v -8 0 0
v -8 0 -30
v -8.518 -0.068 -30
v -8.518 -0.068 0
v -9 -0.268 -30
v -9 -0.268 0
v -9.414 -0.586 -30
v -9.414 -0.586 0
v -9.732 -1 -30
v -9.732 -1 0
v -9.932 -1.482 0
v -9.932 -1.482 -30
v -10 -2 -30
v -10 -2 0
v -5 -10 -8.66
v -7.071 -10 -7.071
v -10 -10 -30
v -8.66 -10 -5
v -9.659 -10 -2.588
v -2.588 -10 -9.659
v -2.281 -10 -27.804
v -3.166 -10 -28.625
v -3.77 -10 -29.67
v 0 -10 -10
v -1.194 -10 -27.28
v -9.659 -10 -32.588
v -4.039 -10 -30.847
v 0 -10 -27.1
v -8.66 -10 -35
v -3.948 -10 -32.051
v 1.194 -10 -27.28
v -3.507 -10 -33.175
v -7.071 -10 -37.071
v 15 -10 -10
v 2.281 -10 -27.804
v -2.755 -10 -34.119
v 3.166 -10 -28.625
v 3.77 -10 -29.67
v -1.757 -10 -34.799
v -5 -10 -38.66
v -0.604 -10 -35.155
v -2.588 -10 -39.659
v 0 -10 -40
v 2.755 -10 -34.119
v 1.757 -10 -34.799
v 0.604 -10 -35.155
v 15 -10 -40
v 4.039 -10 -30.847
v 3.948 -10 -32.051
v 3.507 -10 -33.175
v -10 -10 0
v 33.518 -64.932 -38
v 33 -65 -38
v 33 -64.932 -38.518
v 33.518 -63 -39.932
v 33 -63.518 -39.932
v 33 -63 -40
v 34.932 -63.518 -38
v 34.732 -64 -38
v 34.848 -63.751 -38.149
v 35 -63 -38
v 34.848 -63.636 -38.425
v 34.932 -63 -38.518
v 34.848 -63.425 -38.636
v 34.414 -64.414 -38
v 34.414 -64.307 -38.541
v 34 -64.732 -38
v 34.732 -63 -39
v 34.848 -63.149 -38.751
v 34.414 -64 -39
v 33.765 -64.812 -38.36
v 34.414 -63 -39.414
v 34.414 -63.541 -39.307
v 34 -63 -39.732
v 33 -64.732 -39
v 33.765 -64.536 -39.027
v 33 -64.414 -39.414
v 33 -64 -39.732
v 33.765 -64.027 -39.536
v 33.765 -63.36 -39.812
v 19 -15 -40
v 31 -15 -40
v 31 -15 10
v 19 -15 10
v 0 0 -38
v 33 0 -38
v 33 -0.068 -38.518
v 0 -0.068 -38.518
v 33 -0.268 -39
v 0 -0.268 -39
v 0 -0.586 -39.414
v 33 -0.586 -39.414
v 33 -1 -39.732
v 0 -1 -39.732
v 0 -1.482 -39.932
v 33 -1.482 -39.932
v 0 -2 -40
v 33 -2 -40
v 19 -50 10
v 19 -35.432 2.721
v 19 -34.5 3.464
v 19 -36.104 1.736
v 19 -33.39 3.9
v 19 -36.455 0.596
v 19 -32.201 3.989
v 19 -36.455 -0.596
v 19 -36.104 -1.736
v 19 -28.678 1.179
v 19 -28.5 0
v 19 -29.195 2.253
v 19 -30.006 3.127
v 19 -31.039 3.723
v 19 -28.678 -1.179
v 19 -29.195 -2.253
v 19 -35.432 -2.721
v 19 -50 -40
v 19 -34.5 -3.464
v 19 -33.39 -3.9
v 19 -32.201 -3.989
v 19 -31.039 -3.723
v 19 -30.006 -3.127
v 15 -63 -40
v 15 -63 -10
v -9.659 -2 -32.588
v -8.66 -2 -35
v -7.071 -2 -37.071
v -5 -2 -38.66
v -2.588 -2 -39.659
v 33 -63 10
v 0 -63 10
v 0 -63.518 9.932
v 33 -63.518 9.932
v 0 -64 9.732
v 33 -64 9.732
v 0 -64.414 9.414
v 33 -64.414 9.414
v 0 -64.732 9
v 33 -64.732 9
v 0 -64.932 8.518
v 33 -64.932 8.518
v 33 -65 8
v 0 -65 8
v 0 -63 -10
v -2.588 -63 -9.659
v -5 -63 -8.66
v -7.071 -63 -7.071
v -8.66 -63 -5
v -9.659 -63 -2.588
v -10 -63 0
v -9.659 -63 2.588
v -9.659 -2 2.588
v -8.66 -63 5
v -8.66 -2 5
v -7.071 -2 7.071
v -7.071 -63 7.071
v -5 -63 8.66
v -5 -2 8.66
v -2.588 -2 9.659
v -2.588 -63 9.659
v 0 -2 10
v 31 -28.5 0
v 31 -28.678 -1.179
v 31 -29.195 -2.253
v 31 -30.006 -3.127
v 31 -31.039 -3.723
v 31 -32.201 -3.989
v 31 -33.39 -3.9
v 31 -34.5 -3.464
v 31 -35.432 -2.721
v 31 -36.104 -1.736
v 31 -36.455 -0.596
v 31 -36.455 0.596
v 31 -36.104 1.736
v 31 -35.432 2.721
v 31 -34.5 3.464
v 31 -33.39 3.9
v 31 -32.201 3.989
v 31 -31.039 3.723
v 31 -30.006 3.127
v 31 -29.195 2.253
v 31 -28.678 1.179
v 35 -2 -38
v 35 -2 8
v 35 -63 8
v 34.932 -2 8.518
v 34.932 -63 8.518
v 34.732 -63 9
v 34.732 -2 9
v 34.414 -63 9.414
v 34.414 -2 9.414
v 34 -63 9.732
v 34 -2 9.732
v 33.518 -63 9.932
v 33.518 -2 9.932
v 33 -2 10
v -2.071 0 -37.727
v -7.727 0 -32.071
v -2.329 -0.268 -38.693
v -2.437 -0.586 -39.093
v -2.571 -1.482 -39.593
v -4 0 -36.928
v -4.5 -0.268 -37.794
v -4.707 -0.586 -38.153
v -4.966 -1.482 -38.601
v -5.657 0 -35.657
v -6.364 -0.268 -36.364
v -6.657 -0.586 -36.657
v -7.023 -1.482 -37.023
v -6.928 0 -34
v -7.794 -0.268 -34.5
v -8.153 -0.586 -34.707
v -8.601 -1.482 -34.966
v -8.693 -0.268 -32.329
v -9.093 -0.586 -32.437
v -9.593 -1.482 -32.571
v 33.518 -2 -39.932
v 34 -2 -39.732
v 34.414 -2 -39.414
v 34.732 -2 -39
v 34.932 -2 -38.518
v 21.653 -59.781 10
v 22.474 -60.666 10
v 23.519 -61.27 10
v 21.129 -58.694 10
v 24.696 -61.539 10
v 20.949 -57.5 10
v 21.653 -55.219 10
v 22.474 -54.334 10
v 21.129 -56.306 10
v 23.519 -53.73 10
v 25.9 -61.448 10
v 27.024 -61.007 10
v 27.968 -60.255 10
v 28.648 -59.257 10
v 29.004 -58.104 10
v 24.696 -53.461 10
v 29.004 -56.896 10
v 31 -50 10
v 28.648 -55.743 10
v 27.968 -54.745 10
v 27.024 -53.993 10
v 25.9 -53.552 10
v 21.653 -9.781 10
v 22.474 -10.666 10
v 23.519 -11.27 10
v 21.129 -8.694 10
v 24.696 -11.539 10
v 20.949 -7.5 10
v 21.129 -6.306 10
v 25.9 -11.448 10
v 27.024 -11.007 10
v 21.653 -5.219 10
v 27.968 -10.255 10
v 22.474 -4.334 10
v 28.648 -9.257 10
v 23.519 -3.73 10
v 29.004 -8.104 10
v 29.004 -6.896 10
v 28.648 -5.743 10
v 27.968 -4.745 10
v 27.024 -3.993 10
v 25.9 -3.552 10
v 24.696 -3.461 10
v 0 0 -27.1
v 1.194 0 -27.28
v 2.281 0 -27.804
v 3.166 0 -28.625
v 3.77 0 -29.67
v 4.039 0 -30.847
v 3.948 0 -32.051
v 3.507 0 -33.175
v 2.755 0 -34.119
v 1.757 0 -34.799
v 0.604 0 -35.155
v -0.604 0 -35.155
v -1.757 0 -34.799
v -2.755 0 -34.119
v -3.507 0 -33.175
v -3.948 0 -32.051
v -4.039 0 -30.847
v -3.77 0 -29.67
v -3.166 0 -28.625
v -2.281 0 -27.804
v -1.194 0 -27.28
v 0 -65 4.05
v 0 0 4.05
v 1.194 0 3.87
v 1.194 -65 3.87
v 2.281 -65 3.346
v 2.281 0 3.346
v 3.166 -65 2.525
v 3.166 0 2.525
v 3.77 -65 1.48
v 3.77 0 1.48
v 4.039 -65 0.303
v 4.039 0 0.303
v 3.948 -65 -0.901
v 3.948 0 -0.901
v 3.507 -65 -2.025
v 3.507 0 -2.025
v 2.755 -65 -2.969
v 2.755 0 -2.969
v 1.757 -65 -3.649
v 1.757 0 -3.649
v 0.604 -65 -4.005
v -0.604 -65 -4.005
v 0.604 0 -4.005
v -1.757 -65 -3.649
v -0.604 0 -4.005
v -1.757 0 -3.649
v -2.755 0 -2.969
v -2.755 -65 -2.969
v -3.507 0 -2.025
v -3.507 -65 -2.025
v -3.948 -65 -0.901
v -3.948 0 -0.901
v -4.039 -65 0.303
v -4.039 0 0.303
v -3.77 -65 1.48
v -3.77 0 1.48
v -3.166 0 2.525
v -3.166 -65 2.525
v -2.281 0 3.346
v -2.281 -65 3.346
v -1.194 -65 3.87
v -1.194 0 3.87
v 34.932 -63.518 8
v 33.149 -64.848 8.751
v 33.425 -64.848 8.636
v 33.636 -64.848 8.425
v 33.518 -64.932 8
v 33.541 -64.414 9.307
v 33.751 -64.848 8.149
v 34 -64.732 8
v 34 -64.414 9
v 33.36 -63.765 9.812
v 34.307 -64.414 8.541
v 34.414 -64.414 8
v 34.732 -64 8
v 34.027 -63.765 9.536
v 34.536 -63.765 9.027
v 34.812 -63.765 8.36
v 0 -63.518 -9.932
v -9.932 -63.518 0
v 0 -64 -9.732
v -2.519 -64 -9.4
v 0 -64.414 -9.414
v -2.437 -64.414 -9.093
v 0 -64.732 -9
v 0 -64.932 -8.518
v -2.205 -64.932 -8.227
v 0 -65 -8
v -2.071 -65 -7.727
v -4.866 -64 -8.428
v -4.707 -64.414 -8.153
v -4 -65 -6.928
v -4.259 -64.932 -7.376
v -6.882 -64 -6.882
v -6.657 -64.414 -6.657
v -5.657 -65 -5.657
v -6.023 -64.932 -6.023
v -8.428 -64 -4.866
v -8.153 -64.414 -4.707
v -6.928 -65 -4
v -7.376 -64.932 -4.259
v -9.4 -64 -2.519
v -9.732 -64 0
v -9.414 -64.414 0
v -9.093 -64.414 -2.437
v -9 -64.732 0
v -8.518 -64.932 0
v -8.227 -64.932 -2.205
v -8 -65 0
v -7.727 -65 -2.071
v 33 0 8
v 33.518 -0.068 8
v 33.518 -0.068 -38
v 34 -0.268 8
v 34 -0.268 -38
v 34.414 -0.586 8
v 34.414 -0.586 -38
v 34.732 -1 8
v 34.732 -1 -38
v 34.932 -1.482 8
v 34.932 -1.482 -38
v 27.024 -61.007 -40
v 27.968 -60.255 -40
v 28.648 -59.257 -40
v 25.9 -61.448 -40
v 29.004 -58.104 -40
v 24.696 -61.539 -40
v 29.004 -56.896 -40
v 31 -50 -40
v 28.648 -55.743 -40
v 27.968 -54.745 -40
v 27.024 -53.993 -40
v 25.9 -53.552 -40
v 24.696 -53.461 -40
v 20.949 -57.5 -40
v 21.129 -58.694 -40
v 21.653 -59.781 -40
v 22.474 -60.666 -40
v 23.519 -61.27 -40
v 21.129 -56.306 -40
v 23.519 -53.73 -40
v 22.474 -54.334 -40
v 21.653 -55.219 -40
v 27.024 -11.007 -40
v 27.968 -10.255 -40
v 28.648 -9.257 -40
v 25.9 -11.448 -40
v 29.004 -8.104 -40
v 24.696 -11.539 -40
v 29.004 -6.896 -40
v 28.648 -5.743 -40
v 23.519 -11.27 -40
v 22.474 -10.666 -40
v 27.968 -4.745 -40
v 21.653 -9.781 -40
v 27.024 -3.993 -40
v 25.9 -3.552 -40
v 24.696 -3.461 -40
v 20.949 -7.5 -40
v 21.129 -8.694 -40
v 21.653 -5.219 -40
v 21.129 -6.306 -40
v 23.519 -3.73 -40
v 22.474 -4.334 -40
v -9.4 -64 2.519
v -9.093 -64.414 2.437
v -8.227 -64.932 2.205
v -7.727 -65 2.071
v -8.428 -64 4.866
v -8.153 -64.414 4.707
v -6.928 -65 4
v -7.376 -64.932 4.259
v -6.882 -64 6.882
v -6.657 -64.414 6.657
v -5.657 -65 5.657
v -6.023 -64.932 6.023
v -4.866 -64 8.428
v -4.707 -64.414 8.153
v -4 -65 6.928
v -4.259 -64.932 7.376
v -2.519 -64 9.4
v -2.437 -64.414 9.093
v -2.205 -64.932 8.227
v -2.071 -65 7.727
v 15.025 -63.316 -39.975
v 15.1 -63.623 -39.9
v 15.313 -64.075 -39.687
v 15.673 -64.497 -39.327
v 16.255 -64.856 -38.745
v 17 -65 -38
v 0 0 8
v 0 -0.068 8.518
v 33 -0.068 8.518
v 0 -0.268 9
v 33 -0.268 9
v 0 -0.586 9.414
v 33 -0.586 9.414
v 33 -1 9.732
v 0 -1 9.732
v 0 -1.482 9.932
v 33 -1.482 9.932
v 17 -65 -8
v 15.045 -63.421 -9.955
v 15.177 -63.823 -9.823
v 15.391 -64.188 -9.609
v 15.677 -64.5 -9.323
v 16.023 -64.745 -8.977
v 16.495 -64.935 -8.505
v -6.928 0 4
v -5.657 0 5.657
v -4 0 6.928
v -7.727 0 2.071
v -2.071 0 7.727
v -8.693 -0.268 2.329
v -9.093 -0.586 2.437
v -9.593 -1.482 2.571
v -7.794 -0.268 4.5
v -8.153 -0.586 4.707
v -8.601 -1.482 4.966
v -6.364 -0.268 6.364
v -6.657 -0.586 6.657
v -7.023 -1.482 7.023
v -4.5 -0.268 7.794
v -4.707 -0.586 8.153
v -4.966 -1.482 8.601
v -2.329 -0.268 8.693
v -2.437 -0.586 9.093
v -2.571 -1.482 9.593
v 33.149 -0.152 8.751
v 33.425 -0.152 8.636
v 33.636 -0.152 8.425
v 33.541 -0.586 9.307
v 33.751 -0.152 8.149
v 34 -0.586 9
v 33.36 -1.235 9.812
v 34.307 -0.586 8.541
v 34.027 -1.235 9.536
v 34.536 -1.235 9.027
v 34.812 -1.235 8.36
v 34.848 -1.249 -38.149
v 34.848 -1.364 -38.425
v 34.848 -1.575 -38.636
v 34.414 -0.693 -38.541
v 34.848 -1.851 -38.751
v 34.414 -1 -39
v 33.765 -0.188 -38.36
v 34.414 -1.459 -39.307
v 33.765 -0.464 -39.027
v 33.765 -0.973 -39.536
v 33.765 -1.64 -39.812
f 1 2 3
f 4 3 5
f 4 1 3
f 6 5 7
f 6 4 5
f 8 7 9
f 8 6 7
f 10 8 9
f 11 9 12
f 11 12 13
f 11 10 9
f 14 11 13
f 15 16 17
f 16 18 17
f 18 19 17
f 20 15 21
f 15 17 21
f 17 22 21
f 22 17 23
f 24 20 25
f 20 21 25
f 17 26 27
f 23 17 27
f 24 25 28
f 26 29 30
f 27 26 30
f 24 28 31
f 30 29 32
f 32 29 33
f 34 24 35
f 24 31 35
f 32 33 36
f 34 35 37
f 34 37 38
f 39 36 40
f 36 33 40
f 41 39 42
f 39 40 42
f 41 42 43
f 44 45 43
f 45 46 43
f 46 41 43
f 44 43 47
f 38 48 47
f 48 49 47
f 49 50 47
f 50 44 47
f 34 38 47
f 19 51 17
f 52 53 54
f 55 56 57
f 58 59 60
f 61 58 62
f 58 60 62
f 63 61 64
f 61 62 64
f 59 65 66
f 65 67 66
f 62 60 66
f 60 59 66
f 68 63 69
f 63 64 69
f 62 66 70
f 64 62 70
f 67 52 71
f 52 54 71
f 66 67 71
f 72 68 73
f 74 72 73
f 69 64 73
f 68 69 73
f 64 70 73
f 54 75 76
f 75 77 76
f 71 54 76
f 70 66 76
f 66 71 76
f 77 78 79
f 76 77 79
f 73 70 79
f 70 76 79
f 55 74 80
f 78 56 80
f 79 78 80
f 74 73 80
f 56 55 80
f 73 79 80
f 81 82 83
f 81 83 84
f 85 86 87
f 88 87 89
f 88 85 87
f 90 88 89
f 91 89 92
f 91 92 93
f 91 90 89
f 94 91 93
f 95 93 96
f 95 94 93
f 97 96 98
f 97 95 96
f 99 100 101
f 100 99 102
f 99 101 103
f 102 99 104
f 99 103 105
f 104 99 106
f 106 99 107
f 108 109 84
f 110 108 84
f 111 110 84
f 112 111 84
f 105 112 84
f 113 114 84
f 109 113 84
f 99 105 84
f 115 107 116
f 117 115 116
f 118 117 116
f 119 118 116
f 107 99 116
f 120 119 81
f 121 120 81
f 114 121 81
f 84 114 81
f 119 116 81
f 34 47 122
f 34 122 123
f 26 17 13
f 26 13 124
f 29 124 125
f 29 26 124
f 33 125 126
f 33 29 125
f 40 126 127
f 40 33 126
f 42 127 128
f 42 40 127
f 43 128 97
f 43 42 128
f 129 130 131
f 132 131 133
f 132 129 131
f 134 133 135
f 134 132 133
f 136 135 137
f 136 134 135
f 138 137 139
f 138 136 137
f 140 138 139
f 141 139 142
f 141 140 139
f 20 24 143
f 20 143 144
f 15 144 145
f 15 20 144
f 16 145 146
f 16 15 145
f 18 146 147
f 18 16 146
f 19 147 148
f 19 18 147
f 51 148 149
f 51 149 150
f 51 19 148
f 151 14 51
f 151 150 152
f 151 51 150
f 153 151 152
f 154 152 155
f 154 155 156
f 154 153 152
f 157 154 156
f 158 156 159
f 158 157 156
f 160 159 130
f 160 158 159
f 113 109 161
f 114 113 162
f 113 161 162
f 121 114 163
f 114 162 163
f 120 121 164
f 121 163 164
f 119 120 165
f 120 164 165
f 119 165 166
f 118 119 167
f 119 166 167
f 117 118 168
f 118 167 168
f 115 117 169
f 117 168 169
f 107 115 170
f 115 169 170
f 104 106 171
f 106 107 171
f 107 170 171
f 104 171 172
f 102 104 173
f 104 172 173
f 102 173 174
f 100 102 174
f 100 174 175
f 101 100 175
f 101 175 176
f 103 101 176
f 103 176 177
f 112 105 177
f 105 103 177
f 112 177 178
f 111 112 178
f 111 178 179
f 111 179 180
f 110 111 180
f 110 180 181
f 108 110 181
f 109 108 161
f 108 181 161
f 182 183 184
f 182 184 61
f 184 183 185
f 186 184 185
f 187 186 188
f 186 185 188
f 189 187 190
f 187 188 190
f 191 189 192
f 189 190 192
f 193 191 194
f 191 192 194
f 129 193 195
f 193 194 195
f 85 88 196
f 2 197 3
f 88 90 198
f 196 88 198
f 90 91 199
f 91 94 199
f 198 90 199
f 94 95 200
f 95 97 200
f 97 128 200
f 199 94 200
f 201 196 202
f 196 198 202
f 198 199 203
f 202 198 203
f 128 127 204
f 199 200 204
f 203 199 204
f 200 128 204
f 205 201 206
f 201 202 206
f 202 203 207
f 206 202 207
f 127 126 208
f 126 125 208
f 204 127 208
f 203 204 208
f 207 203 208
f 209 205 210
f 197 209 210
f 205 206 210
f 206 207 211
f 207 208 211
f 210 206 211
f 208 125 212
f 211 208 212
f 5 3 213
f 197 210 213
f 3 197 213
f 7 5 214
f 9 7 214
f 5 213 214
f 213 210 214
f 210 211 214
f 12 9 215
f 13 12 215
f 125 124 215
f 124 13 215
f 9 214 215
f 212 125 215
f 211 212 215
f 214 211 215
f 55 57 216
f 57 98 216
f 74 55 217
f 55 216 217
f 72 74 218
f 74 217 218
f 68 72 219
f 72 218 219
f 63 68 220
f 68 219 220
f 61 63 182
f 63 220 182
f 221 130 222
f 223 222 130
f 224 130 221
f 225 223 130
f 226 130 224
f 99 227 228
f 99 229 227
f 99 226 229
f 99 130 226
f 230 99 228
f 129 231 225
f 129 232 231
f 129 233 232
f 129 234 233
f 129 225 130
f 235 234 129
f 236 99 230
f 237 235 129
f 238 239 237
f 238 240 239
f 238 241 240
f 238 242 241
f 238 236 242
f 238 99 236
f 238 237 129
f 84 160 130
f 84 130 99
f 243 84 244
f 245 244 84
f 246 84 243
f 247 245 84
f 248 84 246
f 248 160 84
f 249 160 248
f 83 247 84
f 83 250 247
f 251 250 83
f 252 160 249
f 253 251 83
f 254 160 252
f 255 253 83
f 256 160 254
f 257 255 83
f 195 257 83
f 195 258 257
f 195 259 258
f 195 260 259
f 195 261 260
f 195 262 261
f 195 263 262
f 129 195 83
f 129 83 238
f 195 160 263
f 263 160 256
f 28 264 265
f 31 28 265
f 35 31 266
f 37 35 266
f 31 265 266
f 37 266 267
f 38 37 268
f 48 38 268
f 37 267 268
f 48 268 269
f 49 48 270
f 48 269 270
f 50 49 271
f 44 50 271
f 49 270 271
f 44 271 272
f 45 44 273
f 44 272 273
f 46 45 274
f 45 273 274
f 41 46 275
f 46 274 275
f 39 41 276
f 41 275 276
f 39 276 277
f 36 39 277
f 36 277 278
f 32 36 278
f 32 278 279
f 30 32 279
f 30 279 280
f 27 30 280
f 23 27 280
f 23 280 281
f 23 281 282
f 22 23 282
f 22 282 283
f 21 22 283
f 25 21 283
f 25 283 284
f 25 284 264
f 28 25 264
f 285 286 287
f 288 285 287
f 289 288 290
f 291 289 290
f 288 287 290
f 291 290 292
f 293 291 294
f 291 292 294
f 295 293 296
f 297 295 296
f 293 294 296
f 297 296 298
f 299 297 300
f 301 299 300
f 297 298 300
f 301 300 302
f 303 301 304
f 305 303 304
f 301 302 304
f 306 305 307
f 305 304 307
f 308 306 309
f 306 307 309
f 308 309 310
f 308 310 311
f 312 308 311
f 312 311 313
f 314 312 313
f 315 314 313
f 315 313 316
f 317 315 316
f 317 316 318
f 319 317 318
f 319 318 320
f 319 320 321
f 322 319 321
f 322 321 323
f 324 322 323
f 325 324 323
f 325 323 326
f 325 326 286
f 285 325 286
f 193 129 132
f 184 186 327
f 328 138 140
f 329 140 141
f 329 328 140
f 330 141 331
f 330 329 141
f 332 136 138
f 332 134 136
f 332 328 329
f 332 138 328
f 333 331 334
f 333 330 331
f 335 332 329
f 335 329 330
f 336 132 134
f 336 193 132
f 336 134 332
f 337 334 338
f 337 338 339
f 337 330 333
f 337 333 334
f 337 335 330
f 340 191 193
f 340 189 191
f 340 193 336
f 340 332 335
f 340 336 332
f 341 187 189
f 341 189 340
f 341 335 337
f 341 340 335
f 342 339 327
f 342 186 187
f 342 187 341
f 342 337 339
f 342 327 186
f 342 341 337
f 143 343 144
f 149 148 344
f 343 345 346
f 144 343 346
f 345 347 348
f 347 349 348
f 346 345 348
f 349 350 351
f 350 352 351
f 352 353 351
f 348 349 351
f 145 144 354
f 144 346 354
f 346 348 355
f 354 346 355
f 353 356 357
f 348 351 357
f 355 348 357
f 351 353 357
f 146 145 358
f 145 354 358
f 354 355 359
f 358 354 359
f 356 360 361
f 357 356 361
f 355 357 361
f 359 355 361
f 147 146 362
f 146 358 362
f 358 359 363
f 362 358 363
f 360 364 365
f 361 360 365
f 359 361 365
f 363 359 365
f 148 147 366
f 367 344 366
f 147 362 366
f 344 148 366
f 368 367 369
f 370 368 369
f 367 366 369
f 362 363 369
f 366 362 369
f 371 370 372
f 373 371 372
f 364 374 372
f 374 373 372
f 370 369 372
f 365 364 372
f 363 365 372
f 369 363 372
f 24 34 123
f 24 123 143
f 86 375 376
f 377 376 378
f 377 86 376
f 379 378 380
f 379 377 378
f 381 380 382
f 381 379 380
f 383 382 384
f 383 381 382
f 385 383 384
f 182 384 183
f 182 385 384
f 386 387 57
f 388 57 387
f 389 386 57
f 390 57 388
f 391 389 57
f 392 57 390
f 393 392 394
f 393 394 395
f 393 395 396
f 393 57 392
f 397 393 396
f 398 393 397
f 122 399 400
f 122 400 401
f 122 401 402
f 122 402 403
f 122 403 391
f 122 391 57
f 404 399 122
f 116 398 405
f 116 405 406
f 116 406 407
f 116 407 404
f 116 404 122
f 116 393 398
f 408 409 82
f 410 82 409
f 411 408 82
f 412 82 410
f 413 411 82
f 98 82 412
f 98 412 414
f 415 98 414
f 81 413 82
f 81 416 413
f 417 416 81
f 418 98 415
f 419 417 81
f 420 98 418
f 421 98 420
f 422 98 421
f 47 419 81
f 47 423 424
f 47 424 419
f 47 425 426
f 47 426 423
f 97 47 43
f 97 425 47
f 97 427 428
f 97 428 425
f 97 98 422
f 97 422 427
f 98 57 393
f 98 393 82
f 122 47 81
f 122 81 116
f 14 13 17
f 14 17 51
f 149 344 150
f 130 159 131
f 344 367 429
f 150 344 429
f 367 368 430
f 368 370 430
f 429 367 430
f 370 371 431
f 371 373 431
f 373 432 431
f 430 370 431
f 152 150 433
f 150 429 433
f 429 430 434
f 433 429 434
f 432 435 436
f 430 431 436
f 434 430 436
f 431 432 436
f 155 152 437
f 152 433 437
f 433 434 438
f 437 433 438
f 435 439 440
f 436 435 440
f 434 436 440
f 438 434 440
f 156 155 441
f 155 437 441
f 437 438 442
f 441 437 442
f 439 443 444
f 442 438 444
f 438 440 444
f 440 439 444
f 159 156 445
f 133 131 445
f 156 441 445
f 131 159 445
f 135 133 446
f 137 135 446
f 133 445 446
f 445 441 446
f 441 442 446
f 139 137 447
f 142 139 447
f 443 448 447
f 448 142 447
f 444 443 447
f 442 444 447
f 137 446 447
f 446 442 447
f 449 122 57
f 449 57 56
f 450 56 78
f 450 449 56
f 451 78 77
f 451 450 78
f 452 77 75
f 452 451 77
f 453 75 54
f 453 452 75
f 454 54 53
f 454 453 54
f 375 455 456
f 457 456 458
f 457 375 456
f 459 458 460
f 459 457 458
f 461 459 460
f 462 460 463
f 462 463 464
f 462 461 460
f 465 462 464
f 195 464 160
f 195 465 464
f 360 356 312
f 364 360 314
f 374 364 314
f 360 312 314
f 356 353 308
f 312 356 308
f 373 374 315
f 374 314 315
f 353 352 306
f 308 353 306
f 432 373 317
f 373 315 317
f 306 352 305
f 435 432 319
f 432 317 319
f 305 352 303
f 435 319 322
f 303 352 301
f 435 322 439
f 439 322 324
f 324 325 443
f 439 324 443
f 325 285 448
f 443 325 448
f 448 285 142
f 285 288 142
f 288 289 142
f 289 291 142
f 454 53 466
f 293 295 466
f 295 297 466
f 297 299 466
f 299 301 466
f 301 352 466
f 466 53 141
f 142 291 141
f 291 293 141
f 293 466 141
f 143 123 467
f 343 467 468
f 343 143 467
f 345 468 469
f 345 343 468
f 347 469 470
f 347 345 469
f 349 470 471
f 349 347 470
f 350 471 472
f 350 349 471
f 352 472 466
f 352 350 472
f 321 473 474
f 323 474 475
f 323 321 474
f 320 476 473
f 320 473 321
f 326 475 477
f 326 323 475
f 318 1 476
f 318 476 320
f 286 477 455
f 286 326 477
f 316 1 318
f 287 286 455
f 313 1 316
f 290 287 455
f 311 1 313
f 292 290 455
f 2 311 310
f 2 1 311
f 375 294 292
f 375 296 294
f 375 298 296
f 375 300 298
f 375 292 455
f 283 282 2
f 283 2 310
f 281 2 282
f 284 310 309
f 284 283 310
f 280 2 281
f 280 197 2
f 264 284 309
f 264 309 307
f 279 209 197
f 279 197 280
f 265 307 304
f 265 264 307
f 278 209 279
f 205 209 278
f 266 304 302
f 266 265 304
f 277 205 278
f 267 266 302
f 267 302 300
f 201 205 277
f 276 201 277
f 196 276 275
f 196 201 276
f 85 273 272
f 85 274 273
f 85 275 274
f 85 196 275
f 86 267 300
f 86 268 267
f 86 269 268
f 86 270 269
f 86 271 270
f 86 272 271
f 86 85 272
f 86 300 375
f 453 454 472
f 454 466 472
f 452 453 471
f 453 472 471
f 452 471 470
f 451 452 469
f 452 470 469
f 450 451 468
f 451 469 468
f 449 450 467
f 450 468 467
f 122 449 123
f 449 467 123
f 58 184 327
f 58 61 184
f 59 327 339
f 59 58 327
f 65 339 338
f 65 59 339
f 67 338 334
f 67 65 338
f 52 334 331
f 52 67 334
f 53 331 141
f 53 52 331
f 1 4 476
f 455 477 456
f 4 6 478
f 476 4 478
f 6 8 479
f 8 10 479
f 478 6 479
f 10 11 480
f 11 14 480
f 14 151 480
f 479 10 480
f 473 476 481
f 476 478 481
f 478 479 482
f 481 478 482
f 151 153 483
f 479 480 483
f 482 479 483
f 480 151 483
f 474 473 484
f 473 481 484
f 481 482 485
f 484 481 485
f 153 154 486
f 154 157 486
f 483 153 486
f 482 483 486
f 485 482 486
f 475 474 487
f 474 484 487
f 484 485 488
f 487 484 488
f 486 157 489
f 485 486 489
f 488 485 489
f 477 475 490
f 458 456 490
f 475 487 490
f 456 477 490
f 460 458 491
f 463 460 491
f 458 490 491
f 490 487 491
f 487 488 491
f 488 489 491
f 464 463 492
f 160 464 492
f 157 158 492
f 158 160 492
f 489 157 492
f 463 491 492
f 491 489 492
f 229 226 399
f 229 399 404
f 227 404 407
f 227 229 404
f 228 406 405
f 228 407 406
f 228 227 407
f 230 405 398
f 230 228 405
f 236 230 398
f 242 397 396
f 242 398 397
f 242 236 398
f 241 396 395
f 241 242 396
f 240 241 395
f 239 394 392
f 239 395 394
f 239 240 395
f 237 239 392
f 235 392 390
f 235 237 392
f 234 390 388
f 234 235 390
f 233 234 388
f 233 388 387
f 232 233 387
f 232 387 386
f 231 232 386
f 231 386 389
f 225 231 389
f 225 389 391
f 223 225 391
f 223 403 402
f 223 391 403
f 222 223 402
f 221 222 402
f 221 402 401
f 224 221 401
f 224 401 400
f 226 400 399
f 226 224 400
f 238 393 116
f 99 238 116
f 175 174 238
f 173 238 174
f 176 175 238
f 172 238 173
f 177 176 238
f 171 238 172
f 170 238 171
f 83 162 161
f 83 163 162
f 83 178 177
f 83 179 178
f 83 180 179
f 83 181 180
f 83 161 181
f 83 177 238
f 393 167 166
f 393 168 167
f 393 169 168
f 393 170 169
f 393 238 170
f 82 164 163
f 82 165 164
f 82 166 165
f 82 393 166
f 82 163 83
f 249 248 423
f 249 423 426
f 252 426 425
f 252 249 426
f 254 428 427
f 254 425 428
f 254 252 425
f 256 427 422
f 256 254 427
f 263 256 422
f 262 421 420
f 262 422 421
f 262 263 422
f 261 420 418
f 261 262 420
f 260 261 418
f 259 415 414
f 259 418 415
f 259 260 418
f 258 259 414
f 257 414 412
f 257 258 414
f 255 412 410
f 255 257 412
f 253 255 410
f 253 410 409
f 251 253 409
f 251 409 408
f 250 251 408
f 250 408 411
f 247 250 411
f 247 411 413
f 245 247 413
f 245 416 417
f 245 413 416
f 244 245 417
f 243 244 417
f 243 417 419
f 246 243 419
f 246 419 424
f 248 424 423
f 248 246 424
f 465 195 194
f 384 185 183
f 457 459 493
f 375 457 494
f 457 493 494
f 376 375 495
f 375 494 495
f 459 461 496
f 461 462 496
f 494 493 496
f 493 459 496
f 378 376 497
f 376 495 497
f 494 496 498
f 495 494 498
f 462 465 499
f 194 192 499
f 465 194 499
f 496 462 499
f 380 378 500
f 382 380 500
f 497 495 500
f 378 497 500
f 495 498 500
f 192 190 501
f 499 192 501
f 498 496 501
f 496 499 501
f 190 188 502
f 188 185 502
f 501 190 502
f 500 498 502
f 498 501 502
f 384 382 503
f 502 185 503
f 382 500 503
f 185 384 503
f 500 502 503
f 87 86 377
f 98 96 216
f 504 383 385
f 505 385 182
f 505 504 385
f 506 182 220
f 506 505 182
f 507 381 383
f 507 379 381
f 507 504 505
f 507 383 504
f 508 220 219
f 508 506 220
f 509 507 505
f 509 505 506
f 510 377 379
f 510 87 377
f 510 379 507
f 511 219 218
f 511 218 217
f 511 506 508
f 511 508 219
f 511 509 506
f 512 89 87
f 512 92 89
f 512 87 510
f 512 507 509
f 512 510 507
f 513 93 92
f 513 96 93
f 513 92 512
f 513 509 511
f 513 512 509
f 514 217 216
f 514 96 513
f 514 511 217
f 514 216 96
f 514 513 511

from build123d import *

# Parameters (mm, degrees)
SKETCH1_R               = 10
BOSS_EXTRUDE1_DEPTH     = 65
BOSS_EXTRUDE2_DEPTH     = 10
BOSS_EXTRUDE3_DEPTH     = 65
SKETCH4_R               = 4.05
CUT_EXTRUDE1_DEPTH      = 84.964278119
FILLET1_R               = 10
FILLET2_R               = 2
CUT_EXTRUDE2_DEPTH      = 90.162772501
CUT_EXTRUDE2_DEPTH_BACK = 90.162772501
SKETCH6_R               = 4.05
SKETCH7_W               = 12
SKETCH7_H               = 35
CUT_EXTRUDE3_DEPTH      = 90.162772501
BOSS_EXTRUDE4_REACH     = 88.637
SKETCH8_R               = 4


with BuildPart() as part:
    # Sketch1 → Boss-Extrude1 (new body)
    with BuildSketch(Plane(origin=(0, 0, 0), x_dir=(1, 0, 0), z_dir=(0, 1, 0))):
        with Locations(Location((0, 0, 0), (0, 0, 270))):
            Circle(SKETCH1_R)
    extrude(amount=-BOSS_EXTRUDE1_DEPTH)

    # Sketch2 → Boss-Extrude2 (add)
    with BuildSketch(Plane(origin=(0, 0, 0), x_dir=(1, 0, 0), z_dir=(0, 1, 0))):
        with BuildLine():
            Line((0, -10), (35, -10))
            Line((35, -10), (35, 40))
            Line((35, 40), (-10, 40))
            Line((-10, 40), (-10, 0))
            ThreePointArc((-10, 0), (-7.071067812, -7.071067812), (0, -10))
        make_face()
    extrude(amount=-BOSS_EXTRUDE2_DEPTH)

    # Sketch3 → Boss-Extrude3 (add)
    with BuildSketch(Plane(origin=(0, 0, 0), x_dir=(1, 0, 0), z_dir=(0, 1, 0))):
        with BuildLine():
            Line((35, -10), (35, 40))
            Line((35, 40), (15, 40))
            Line((15, 40), (15, 10))
            Line((15, 10), (0, 10))
            ThreePointArc((0, 10), (-7.071067812, 7.071067812), (-10, 0))
            ThreePointArc((-10, 0), (-7.071067812, -7.071067812), (0, -10))
            Line((0, -10), (35, -10))
        make_face()
    extrude(amount=-BOSS_EXTRUDE3_DEPTH)

    # Sketch4 → Cut-Extrude1 (cut, through all)
    with BuildSketch(Plane(origin=(0, 0, 0), x_dir=(1, 0, 0), z_dir=(0, 1, 0))):
        with Locations(Location((0, 0, 0), (0, 0, 270))):
            Circle(SKETCH4_R)
        with Locations(Location((0, 31.15, 0), (0, 0, 270))):
            Circle(SKETCH4_R)
    extrude(amount=-CUT_EXTRUDE1_DEPTH, mode=Mode.SUBTRACT)

    # Fillet1
    fillet1_edges = [part.edges().sort_by_distance(p)[0] for p in [
        (-10, -5, -40),
    ]]
    fillet(fillet1_edges, radius=FILLET1_R)

    # Fillet2
    fillet2_edges = [part.edges().sort_by_distance(p)[0] for p in [
        (35, -32.5, 10),
        (17.5, 0, 10),
        (35, 0, -15),
        (17.5, 0, -40),
        (-10, -65, 0),
        (7.5, -65, -10),
        (15, -65, -25),
        (25, -65, -40),
        (35, -65, -15),
        (17.5, -65, 10),
        (-7.071067812, 0, 7.071067812),
        (-10, 0, -15),
        (-7.071067812, 0, -37.071067812),
        (35, -32.5, -40),
    ]]
    fillet(fillet2_edges, radius=FILLET2_R)

    # Sketch6 → Cut-Extrude2 (cut, two sides: drawn at the far end of the back side and taken through both)
    with BuildSketch(Plane(origin=(0, 0, -40), x_dir=(-1, 0, 0), z_dir=(0, 0, -1)).offset(-CUT_EXTRUDE2_DEPTH_BACK)):
        with Locations((-24.999085547, -7.5)):
            Circle(SKETCH6_R)
        with Locations((-24.999085547, -57.5)):
            Circle(SKETCH6_R)
    extrude(amount=CUT_EXTRUDE2_DEPTH + CUT_EXTRUDE2_DEPTH_BACK, mode=Mode.SUBTRACT)

    # Sketch7 → Cut-Extrude3 (cut, through all)
    with BuildSketch(Plane(origin=(0, 0, -40), x_dir=(-1, 0, 0), z_dir=(0, 0, -1))):
        with Locations((-25, -32.5)):
            Rectangle(SKETCH7_W, SKETCH7_H)
    extrude(amount=-CUT_EXTRUDE3_DEPTH, mode=Mode.SUBTRACT)

    # Sketch8 → Boss-Extrude4 (add, up to next)
    with BuildSketch(Plane.ZY.offset(-31), mode=Mode.PRIVATE) as boss_extrude4_sk1:
        with Locations(Location((0, -32.5, 0), (0, 0, 90))):
            Circle(SKETCH8_R)
    boss_extrude4_tool1 = extrude(boss_extrude4_sk1.sketch, amount=BOSS_EXTRUDE4_REACH, mode=Mode.PRIVATE) - part.part
    add(boss_extrude4_tool1.solids().sort_by_distance((31, -32.5, 0))[0])


solid = part.part
